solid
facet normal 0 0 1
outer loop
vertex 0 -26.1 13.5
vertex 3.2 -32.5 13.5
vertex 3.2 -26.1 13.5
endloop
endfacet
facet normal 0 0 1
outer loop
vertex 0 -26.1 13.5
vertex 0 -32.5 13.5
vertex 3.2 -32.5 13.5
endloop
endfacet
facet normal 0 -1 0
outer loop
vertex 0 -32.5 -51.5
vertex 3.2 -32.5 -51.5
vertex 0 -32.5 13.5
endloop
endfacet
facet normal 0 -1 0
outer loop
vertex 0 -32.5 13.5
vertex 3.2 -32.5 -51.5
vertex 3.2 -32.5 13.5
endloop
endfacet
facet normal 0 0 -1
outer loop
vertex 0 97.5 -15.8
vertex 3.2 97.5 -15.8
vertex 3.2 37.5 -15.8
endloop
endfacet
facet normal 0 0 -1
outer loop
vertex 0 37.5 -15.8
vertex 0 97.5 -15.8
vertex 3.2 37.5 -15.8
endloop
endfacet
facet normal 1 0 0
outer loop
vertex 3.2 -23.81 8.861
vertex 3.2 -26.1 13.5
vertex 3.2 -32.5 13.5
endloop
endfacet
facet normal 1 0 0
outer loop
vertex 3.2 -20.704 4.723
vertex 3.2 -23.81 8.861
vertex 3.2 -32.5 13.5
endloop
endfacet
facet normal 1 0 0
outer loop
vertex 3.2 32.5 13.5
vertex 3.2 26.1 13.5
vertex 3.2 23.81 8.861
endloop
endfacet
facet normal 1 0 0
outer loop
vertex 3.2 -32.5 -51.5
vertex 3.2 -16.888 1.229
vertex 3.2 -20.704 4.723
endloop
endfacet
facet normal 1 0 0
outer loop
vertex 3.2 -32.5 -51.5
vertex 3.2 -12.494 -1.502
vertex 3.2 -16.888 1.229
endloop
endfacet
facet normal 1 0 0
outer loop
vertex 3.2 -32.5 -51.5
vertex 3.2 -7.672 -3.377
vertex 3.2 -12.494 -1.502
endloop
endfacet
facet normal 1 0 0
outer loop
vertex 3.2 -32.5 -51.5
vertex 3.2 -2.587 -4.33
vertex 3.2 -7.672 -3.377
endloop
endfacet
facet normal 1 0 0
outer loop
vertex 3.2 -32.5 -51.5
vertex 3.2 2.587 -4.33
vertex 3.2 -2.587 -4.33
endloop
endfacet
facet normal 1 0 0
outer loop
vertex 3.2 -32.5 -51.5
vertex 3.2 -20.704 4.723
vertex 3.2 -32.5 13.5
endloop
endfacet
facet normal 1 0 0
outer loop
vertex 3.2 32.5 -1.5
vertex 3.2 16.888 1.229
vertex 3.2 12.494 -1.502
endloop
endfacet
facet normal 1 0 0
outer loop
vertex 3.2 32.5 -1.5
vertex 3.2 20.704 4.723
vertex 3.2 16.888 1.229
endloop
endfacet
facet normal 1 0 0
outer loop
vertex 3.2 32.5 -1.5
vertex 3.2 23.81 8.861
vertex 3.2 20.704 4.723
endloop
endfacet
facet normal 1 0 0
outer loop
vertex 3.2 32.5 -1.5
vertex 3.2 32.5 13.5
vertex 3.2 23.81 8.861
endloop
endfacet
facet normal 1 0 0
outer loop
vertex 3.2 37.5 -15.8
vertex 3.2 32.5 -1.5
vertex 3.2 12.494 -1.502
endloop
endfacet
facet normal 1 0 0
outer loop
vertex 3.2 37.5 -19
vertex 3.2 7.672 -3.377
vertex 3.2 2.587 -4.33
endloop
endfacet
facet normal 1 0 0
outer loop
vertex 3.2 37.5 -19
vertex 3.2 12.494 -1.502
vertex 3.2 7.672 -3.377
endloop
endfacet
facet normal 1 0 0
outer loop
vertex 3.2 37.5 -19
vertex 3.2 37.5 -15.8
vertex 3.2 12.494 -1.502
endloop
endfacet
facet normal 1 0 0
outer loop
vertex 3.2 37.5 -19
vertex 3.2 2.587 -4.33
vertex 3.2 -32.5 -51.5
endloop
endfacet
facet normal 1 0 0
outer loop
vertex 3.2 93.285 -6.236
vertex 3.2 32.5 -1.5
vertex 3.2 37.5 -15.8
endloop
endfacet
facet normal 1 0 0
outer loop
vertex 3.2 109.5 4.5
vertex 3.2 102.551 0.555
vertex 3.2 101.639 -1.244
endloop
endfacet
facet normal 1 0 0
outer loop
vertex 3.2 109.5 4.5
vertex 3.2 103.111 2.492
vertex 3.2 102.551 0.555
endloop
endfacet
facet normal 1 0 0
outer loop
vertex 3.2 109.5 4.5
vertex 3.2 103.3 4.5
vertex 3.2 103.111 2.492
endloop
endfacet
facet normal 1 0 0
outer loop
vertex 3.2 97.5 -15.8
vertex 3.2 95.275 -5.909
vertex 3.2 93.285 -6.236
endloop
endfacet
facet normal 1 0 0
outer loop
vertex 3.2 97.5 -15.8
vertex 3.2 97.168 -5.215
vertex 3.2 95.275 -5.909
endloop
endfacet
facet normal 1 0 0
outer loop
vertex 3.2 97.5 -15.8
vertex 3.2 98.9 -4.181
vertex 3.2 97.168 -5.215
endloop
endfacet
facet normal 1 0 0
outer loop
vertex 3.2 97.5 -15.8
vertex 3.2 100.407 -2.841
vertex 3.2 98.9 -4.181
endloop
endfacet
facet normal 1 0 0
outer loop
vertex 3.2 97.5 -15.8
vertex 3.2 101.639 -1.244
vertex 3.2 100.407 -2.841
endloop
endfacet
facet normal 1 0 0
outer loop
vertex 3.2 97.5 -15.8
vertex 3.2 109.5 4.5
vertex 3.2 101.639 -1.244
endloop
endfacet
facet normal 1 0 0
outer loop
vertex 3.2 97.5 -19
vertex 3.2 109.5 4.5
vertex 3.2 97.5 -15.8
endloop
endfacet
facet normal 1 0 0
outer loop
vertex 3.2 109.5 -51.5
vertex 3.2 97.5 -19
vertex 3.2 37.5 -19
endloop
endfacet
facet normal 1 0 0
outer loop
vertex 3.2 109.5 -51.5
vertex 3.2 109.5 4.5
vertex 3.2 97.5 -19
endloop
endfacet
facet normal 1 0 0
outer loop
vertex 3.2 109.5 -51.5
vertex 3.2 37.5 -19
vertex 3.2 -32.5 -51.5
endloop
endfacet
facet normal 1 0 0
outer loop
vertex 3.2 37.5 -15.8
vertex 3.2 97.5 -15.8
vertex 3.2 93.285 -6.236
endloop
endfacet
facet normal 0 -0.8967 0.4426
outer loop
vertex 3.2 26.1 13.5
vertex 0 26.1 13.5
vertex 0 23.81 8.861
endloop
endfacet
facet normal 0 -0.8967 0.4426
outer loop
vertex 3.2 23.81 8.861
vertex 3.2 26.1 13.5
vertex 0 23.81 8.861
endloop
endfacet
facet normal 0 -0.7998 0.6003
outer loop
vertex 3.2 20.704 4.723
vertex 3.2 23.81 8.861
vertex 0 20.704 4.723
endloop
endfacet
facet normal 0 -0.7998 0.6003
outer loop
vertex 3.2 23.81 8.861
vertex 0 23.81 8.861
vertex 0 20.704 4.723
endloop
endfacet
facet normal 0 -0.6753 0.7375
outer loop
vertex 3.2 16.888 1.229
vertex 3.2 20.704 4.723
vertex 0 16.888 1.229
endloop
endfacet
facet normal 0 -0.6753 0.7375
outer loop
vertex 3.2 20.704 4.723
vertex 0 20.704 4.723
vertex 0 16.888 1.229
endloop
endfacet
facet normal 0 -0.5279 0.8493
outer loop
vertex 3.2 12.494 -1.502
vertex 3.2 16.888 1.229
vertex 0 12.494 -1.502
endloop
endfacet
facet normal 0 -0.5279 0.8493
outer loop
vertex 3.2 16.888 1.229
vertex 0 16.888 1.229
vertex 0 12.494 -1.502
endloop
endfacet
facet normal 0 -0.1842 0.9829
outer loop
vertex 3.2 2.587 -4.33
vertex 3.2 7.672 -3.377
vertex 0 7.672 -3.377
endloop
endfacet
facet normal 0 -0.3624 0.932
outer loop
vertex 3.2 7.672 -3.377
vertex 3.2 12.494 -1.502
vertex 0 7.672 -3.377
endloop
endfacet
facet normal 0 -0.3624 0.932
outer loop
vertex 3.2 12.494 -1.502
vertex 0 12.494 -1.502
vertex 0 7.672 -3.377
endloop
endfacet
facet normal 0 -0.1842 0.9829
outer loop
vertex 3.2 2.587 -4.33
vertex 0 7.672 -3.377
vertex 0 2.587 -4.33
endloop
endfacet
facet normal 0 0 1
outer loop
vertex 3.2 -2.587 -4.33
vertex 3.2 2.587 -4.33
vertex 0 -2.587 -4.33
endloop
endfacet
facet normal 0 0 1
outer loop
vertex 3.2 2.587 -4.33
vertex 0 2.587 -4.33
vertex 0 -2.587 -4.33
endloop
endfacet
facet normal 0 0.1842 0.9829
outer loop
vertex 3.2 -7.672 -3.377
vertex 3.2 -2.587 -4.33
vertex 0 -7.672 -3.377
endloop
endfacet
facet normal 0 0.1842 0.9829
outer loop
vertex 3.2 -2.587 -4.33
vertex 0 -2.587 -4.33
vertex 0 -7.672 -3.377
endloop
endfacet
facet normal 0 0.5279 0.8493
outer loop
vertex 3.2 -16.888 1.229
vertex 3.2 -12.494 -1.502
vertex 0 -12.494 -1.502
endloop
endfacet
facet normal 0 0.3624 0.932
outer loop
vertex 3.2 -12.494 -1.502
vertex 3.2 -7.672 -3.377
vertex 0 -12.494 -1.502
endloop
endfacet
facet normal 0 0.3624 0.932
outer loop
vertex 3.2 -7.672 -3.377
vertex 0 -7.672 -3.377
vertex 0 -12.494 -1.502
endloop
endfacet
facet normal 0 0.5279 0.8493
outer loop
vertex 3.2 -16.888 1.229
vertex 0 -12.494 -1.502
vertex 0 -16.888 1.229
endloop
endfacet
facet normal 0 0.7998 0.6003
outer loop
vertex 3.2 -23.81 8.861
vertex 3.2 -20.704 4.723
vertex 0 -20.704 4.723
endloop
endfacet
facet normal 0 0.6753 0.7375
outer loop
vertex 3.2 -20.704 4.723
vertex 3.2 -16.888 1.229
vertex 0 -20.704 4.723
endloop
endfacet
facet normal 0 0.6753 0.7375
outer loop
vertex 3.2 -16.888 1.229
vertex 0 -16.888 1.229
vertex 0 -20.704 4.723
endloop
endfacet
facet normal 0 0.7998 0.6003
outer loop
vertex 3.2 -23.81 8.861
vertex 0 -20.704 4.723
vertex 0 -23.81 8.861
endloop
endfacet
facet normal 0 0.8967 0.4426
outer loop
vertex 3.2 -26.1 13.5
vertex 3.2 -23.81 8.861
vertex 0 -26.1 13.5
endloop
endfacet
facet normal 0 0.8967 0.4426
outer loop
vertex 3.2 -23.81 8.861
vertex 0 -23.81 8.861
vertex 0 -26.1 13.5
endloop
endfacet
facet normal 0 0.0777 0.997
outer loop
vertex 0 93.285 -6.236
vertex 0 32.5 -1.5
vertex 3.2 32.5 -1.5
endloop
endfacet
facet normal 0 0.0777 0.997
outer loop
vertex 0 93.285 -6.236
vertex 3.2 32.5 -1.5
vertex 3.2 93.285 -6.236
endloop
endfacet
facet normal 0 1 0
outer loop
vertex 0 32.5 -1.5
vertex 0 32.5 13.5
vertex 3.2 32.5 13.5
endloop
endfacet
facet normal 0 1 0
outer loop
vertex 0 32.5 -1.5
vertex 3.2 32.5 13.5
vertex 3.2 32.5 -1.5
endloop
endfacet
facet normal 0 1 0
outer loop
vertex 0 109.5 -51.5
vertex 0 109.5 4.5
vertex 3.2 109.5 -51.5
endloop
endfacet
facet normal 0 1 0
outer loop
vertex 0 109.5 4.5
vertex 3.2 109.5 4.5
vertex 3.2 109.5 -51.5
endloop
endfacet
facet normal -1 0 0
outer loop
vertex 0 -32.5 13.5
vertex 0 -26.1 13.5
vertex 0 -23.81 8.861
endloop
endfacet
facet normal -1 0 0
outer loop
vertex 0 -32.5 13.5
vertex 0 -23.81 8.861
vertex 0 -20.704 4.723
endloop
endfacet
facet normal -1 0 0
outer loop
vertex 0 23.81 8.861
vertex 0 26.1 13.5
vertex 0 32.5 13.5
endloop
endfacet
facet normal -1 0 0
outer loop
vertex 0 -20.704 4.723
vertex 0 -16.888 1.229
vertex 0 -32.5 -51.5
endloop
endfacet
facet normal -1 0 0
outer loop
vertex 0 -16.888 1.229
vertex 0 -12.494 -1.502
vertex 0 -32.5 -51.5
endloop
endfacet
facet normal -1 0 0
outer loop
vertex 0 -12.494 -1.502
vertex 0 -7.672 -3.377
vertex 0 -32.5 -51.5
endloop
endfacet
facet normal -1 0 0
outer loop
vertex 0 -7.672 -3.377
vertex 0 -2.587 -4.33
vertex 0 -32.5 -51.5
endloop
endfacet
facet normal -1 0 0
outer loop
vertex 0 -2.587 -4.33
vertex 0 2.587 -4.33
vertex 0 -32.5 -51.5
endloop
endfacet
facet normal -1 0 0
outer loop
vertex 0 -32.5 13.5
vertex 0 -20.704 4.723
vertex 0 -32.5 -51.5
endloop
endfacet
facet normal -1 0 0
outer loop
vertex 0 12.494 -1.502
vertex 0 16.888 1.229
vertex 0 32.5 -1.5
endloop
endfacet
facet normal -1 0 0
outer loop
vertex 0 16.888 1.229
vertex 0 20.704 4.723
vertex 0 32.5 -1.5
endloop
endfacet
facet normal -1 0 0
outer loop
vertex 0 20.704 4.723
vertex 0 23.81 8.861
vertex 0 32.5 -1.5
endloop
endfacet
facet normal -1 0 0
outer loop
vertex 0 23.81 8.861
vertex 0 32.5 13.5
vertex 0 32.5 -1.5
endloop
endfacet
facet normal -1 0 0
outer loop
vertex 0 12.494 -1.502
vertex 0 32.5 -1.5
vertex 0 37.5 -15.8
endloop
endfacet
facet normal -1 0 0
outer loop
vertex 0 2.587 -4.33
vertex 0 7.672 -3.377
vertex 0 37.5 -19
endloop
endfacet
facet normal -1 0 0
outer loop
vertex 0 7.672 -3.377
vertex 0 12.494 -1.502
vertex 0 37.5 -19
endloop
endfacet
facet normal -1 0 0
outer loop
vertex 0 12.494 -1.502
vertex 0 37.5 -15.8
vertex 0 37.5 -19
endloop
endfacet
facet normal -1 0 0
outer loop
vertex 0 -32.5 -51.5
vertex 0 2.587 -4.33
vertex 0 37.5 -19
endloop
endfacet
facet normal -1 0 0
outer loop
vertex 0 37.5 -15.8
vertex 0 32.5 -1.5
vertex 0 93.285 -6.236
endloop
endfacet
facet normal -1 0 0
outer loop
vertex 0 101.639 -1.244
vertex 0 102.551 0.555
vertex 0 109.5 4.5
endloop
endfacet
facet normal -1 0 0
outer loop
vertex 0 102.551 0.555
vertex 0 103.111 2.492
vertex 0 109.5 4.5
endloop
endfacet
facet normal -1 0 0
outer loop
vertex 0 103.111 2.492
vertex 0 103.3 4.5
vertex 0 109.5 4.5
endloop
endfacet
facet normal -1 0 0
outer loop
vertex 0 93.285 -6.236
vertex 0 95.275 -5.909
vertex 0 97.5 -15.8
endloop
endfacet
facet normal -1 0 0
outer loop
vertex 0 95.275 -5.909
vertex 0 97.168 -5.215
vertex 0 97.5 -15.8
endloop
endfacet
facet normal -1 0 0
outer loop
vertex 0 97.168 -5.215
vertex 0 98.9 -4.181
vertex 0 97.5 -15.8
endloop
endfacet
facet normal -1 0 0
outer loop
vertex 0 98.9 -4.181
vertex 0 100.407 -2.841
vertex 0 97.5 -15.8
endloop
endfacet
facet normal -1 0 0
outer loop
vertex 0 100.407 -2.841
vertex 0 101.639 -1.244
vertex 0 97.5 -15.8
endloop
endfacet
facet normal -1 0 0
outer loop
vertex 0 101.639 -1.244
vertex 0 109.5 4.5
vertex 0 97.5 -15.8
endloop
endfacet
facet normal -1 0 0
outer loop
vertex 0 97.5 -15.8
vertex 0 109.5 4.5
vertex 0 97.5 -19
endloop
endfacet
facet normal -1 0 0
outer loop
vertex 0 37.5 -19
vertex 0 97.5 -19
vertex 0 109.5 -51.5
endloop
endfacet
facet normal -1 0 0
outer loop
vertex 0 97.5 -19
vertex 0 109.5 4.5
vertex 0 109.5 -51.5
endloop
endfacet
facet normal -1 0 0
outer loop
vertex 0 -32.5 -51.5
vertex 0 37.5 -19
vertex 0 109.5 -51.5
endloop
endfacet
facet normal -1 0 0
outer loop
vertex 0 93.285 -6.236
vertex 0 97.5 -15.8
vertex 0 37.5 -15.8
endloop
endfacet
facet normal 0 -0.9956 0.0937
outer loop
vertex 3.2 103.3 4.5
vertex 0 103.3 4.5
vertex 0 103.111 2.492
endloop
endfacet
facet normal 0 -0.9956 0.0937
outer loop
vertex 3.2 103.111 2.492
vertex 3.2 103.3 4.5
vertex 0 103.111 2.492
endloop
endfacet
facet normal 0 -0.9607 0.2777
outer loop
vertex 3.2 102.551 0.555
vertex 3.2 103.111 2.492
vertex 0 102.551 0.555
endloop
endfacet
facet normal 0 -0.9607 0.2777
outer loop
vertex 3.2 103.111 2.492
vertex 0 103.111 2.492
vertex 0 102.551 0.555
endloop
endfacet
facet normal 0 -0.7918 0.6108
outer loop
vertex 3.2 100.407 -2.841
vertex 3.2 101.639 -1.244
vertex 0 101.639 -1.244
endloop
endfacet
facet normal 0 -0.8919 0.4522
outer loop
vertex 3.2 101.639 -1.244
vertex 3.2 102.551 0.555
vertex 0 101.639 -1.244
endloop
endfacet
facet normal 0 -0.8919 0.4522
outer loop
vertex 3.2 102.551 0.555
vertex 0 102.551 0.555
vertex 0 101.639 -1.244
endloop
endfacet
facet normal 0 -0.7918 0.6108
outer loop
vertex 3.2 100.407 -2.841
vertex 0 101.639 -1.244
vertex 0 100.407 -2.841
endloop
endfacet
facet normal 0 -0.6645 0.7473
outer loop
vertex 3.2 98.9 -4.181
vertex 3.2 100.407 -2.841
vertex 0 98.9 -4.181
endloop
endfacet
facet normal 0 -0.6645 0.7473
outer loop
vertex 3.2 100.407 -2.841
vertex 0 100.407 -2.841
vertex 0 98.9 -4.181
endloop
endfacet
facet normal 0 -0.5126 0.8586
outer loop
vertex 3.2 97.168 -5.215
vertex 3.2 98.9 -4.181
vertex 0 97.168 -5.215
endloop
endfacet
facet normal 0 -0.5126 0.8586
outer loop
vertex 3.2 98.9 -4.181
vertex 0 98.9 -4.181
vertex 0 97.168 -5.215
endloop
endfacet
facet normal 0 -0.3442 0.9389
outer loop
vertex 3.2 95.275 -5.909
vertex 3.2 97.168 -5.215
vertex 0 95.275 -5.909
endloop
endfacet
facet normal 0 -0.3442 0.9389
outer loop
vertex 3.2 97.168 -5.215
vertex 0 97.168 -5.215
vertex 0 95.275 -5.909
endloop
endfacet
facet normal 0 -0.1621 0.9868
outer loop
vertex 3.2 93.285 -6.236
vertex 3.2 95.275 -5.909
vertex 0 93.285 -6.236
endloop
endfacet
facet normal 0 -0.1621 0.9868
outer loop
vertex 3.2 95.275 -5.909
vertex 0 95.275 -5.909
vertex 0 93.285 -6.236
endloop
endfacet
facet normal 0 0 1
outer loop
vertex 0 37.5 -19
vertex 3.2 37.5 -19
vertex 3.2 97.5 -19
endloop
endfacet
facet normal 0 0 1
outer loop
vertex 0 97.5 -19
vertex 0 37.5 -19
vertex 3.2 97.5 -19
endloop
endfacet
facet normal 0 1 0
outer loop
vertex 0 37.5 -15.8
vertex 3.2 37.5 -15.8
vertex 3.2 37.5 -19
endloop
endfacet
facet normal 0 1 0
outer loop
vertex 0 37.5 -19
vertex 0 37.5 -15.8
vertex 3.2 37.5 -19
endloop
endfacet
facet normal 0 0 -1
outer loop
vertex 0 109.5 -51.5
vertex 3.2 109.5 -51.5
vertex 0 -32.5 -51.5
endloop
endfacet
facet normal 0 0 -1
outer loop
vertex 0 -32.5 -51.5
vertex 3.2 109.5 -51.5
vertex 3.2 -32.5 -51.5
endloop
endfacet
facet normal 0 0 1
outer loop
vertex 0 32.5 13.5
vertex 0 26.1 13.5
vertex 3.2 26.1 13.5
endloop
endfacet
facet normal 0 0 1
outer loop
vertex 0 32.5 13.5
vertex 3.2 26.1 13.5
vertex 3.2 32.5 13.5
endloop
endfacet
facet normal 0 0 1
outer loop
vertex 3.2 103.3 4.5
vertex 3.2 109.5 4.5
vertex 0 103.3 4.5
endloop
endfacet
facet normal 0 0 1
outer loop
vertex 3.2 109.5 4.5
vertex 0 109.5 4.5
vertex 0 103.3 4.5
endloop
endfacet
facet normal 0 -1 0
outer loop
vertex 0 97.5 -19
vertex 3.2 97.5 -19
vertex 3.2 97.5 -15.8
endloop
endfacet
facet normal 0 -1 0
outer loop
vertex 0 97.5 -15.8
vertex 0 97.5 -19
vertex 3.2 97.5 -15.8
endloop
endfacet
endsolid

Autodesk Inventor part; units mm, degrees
ref_plane "YZ Plane" through (0, 0, 0) normal (1, 0, 0) x (0, 1, 0)
ref_plane "XZ Plane" through (0, 0, 0) normal (0, 1, 0) x (-1, 0, 0)
ref_plane "XY Plane" through (0, 0, 0) normal (0, 0, 1) x (1, 0, 0)
sketch "Sketch1" plane through (0, 0, 0) normal (1, 0, 0) x (0, 1, 0)
  line L0 (-32.5, 13.5) -> (32.5, 13.5)
  line L1 (32.5, 13.5) -> (32.5, -13.5)
  line L2 (32.5, -13.5) -> (-32.5, -13.5)
  line L3 (-32.5, -13.5) -> (-32.5, 13.5)
  line L4 (-32.5, 13.5) -> (32.5, -13.5) construction
  line L5 (32.5, 13.5) -> (-32.5, -13.5) construction
  arc A0 (-26.1, 13.5) -> (26.1, 13.5) centre (0, 23.5) ccw
  line L6 (32.5, -13.5) -> (109.5, -13.5)
  line L7 (32.5, -1.5) -> (109.5, -7.5)
  line L8 (109.5, -7.5) -> (109.5, -13.5)
  line L9 (109.5, -7.5) -> (109.5, 4.5)
  line L10 (109.5, 4.5) -> (103.3, 4.5)
  arc A1 (90.1361, -5.9911) -> (103.3, 4.5) centre (92.5375, 4.5) ccw
  point P0 (0, 0)
  point P1 (0, 13.5)
  point P2 (32.5, -0.0243)
  point P3 (93.2849, -6.2365)
  dimension "d0" = 27
  dimension "d1" = 65
  dimension "d3" = 6.4
  dimension "d4" = 6.4
  dimension "d5" = 10
  dimension "d8" = 6
  dimension "d9" = 12
  dimension "d10" = 77
  dimension "d11" = 6.2
  dimension "d12" = 12
  dimension "d13" = 10.7625
extrude "Extrusion1" add sketch "Sketch1" along normal blind 3.2 contours L0 A0 L1 L2 L3 | L1 L7 A1 L8 L6 | L7 A1 | L7 A1 L10 L9
sketch "Sketch2" plane through (3.2, 0, 0) normal (1, 0, 0) x (0, 0, -1)
  line L0 (13.5, -32.5) -> (13.5, 109.5) projected
  line L1 (13.5, 109.5) -> (51.5, 109.5)
  line L2 (51.5, 109.5) -> (51.5, -32.5)
  line L3 (51.5, -32.5) -> (13.5, -32.5)
  line L4 (13.5, -32.5) -> (13.5, 109.5)
  line L5 (-13.5, -32.5) -> (13.5, -32.5) projected
  point P0 (0, 0)
  dimension "d14" = 38
extrude "Extrusion2" add sketch "Sketch2" against normal blind 3.2
sketch "Sketch3" plane through (3.2, 0, 0) normal (1, 0, 0) x (0, 0, -1)
  line L0 (1.5, 32.5) -> (-13.5, 32.5) construction
  line L1 (1.5, 32.5) -> (15.8, 32.5) construction
  line L2 (15.8, 37.5) -> (19, 37.5)
  line L3 (19, 37.5) -> (19, 97.5)
  line L4 (19, 97.5) -> (15.8, 97.5)
  line L5 (15.8, 97.5) -> (15.8, 37.5)
  line L6 (51.5, 109.5) -> (-4.5, 109.5) construction
  point P0 (0, 0)
  dimension "d17" = 14.3
  dimension "d18" = 3.2
  dimension "d19" = 60
  dimension "d21" = 12
extrude "Extrusion3" cut sketch "Sketch3" against normal blind 3.2
properties part number "SideSupports"
